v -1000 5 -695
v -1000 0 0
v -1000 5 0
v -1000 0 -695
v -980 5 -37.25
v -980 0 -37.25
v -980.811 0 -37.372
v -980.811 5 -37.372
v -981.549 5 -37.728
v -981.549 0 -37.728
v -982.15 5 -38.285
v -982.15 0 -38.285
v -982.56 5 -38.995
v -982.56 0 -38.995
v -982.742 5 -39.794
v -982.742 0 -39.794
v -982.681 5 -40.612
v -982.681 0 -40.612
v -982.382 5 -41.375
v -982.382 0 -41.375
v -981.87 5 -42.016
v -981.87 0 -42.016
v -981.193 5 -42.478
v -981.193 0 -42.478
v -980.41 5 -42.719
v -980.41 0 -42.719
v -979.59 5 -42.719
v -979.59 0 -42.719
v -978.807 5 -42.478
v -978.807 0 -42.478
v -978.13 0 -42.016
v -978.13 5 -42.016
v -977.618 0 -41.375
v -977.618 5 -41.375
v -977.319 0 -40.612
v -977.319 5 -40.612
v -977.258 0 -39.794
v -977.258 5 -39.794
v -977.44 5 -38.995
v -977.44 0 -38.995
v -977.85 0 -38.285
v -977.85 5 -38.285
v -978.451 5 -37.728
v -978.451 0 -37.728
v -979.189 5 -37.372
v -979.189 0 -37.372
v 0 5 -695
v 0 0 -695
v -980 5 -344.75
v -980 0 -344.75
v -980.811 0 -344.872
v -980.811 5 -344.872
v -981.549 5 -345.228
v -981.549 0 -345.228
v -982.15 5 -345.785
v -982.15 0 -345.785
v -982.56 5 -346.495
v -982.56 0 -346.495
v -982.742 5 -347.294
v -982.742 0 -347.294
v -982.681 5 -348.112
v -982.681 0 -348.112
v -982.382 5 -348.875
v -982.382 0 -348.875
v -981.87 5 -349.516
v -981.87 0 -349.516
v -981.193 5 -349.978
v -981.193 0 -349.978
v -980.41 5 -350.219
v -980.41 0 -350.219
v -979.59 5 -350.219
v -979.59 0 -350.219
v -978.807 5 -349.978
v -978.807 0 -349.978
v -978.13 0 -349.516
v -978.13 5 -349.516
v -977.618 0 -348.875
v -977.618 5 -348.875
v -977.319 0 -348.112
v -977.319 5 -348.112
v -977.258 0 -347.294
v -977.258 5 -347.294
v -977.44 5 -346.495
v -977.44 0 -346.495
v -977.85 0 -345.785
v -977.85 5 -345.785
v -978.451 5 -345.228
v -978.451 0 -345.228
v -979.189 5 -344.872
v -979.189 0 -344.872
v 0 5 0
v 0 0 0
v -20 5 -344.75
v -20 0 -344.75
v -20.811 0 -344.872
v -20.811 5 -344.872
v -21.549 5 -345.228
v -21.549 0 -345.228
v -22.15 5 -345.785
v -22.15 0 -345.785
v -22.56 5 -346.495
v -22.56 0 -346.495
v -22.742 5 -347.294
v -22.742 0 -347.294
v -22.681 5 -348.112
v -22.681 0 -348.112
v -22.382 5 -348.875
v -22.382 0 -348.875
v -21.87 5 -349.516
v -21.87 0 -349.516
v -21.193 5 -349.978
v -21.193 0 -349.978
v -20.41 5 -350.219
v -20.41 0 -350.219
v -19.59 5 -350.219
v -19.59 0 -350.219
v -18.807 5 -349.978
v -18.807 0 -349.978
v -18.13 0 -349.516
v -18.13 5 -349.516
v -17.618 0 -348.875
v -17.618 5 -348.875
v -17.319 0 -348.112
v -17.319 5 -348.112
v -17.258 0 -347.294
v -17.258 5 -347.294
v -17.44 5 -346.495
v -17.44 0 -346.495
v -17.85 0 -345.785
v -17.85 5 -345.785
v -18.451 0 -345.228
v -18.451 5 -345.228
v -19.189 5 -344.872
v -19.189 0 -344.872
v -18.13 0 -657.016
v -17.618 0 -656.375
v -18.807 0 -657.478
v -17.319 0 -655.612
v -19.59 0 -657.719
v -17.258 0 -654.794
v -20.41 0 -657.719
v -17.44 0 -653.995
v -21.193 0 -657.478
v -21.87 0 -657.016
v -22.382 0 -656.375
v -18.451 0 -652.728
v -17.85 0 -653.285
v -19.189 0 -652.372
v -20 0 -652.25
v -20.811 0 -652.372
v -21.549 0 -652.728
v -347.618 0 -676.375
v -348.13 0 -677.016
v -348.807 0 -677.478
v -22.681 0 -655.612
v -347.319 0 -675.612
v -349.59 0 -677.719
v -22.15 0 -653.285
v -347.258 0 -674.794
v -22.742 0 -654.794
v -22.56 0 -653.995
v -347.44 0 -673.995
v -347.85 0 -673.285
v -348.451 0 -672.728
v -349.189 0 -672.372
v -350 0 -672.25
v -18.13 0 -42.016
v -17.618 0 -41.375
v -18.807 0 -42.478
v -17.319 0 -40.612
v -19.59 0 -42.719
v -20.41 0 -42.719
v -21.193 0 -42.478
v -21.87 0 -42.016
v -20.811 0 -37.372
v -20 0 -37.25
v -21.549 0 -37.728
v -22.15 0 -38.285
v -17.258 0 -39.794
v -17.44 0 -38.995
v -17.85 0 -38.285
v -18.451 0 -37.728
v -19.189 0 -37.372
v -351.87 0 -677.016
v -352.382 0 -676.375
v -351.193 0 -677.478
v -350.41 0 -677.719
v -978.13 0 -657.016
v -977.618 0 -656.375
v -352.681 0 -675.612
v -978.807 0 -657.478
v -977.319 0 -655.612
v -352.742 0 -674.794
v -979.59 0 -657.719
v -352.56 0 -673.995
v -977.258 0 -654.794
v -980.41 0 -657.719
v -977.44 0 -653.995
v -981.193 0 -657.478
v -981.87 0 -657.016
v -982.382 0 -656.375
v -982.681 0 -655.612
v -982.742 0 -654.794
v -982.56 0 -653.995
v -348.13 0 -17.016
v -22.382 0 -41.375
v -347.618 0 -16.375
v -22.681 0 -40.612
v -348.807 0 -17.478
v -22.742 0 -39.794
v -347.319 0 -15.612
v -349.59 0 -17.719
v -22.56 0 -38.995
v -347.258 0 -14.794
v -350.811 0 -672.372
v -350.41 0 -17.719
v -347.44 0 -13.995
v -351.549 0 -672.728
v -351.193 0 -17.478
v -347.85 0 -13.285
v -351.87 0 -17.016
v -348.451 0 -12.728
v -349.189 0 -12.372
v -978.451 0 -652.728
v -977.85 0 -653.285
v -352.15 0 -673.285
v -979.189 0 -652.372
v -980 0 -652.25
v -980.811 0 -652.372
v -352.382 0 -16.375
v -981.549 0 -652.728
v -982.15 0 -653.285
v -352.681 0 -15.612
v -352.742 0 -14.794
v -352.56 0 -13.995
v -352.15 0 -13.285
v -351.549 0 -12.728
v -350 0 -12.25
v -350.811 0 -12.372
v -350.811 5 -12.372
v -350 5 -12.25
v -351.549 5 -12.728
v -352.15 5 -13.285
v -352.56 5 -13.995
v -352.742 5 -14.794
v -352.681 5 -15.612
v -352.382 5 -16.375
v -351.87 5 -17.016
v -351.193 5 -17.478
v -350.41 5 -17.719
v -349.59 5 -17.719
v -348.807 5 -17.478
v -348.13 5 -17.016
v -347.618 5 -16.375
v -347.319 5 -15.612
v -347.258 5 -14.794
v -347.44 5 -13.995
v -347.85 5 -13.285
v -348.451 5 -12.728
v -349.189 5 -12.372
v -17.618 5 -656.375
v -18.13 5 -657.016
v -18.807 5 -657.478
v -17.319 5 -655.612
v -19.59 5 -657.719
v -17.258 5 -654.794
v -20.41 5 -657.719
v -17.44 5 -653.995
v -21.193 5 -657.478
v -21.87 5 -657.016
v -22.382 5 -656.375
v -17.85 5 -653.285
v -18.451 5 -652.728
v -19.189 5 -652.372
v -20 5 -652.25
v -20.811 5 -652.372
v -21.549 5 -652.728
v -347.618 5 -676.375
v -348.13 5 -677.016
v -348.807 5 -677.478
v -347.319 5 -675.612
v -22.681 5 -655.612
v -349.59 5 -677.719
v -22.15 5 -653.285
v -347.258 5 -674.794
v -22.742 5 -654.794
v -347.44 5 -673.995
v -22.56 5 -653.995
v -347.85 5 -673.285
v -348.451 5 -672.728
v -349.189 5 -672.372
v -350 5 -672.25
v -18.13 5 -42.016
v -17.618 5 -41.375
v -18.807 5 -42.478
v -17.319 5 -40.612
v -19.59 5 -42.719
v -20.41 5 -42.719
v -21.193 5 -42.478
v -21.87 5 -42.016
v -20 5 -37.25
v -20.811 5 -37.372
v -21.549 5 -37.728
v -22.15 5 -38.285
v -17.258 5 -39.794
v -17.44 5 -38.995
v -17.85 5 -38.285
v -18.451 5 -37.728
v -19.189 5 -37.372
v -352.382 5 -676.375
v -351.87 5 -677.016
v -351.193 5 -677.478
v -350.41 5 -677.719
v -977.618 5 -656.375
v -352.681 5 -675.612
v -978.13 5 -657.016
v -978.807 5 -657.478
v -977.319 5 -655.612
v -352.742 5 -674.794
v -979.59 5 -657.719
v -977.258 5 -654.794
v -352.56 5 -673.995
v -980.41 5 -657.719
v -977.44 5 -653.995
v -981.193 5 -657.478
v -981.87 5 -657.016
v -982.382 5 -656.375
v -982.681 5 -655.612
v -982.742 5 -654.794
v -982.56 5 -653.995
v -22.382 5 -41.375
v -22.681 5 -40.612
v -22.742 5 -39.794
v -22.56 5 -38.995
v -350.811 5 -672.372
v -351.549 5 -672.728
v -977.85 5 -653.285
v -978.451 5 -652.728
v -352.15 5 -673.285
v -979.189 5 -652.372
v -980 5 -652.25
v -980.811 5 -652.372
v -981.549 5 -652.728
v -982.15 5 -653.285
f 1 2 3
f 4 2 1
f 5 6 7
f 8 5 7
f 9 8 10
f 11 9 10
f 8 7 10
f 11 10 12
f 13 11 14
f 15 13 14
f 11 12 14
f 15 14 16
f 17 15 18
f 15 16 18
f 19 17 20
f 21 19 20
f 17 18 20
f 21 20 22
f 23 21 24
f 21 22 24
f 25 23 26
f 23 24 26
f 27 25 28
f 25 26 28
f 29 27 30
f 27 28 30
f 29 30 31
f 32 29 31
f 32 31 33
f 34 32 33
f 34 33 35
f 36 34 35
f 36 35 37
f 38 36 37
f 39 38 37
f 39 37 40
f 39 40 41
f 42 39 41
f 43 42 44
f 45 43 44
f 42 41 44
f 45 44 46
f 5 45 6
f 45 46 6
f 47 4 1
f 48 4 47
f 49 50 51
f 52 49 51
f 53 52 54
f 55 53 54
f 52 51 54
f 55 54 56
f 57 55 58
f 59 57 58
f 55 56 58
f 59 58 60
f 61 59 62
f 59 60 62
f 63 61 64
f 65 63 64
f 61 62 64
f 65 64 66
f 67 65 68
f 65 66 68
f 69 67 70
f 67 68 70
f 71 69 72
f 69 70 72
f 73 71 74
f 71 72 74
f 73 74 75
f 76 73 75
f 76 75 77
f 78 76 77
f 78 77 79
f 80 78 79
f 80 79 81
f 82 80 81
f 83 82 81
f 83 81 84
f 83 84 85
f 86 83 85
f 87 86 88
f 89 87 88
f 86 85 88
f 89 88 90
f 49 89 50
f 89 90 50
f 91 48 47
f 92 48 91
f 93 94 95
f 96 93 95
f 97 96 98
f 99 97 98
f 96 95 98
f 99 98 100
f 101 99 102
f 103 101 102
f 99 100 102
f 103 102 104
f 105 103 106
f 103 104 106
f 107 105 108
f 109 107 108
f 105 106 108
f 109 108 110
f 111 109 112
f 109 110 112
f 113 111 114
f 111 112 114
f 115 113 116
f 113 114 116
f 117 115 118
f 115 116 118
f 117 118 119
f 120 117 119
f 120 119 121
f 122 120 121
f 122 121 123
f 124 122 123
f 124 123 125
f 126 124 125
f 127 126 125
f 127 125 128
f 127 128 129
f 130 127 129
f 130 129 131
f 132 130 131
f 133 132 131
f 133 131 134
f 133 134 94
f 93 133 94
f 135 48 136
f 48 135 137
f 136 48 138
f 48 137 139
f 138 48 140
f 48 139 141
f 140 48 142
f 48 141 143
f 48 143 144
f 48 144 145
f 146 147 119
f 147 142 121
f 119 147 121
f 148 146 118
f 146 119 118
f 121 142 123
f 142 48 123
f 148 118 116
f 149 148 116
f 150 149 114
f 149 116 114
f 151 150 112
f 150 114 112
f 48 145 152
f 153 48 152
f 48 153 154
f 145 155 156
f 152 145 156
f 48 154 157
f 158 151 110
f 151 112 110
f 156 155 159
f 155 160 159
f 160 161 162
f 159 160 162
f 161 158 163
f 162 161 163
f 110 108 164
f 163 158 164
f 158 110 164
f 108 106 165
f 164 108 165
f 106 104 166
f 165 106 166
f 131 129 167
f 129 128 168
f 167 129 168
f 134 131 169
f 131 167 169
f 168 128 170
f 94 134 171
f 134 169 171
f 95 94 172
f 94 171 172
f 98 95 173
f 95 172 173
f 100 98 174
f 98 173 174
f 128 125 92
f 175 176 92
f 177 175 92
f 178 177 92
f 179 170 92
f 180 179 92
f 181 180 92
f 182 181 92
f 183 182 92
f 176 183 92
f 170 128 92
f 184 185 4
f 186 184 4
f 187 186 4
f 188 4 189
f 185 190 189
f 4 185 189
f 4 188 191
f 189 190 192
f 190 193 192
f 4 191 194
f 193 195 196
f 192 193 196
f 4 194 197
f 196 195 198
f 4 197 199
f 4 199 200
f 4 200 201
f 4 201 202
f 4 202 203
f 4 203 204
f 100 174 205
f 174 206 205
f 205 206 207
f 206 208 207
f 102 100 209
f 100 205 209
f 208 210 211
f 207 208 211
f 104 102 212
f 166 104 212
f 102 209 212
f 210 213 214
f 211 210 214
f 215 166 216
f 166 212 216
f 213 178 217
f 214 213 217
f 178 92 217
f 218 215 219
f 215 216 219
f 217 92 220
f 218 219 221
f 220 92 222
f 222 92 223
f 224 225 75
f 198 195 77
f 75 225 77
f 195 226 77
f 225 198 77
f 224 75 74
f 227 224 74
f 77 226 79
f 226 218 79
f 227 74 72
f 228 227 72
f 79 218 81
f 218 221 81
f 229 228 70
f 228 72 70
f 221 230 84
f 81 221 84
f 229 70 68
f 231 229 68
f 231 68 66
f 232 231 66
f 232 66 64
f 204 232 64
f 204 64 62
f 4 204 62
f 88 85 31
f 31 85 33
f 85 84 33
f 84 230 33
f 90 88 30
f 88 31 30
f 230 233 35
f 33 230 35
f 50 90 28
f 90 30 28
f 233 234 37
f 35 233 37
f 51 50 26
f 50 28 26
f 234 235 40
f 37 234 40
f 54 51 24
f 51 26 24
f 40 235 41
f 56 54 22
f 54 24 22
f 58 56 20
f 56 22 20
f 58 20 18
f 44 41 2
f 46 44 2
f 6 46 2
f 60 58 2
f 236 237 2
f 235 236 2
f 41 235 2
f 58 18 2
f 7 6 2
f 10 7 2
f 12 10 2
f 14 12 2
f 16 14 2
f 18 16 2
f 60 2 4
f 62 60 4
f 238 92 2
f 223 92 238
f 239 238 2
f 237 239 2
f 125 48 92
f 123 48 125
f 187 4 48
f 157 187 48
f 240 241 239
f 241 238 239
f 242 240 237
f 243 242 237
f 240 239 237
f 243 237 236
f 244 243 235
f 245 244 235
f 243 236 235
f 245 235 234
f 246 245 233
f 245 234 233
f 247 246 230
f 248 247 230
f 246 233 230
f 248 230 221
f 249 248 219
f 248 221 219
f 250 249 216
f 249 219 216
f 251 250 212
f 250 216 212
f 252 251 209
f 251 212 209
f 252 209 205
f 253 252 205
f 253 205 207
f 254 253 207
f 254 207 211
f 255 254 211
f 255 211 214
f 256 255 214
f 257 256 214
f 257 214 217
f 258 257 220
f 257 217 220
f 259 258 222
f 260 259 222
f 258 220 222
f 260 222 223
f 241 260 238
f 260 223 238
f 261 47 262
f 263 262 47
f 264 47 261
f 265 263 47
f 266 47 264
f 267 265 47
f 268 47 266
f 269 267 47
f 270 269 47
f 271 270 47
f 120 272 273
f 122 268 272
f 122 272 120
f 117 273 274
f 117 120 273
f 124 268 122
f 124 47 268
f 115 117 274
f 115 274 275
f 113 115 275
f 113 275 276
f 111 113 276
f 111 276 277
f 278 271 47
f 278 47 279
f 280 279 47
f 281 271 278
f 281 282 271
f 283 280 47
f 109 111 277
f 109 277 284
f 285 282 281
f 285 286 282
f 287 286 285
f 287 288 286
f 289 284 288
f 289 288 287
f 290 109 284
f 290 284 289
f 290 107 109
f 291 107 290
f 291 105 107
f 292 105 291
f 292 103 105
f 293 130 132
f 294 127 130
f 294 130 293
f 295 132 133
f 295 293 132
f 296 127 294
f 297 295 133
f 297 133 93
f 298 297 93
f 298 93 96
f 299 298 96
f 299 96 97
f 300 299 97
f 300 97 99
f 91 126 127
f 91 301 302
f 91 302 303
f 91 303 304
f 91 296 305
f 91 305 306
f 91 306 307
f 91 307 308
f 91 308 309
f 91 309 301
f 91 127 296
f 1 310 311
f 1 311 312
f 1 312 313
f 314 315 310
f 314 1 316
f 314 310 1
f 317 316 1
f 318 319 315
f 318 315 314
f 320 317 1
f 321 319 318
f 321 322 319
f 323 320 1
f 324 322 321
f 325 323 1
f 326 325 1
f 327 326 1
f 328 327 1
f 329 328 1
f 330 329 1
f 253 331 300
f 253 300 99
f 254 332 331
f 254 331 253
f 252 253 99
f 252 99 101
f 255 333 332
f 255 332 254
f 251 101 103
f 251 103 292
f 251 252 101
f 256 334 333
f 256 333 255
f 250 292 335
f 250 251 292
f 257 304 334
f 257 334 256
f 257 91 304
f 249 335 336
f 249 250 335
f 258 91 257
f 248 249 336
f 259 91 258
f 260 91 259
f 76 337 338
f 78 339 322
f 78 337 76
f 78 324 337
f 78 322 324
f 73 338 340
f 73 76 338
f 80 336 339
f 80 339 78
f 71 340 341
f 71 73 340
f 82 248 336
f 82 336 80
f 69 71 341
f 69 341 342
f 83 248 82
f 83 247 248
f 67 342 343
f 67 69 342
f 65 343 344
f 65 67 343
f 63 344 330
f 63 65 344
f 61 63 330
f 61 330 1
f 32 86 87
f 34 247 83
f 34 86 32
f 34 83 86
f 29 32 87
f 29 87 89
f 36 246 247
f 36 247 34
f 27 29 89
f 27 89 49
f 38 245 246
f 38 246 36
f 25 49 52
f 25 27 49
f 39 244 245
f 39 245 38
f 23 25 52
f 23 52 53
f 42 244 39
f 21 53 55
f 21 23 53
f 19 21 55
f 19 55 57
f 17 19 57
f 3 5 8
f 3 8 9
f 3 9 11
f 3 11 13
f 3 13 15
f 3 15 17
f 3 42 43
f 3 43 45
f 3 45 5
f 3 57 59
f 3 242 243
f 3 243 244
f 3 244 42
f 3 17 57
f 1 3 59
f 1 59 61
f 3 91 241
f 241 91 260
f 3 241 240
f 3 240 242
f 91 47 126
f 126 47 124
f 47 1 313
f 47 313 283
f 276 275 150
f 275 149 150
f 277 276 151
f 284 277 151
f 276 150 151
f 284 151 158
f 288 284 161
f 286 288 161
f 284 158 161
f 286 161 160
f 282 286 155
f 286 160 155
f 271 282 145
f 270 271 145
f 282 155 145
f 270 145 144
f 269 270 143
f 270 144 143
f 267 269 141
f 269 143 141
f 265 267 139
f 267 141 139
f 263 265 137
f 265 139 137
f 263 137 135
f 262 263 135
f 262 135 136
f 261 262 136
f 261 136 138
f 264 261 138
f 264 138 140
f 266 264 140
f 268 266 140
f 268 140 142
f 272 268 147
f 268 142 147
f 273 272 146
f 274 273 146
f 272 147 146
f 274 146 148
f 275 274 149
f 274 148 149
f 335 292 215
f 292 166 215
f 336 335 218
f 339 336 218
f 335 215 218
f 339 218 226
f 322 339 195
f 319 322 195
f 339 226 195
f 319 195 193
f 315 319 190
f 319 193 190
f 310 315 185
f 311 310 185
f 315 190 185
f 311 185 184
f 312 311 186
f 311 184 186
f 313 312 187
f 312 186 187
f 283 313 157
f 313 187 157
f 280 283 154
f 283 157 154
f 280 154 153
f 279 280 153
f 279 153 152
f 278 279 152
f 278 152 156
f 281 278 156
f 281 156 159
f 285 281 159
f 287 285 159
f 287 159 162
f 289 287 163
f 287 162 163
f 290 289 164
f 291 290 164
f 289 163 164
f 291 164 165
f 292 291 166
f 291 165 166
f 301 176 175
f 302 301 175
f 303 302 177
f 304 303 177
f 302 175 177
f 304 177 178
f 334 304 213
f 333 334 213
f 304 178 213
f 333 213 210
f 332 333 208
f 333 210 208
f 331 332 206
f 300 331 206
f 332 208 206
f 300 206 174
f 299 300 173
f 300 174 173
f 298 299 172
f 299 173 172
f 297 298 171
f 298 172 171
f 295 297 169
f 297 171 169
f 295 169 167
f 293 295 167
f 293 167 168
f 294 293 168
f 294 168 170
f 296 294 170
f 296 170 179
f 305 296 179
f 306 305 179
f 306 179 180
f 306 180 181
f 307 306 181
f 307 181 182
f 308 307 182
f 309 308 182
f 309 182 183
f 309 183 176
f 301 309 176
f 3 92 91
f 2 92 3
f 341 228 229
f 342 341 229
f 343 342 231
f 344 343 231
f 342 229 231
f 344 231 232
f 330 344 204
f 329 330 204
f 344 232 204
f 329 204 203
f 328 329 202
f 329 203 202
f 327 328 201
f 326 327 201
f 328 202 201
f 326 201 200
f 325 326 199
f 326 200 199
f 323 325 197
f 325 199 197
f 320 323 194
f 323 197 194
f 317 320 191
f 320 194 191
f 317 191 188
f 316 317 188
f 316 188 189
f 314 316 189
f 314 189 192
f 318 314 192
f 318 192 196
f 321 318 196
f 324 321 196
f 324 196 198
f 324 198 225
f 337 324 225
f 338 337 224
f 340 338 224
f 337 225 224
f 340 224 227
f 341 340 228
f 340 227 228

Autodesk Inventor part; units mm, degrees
ref_plane "YZ Plane" through (0, 0, 0) normal (1, 0, 0) x (0, 1, 0)
ref_plane "XZ Plane" through (0, 0, 0) normal (0, 1, 0) x (-1, 0, 0)
ref_plane "XY Plane" through (0, 0, 0) normal (0, 0, 1) x (1, 0, 0)
sketch "Sketch1" plane through (0, 0, 0) normal (0, 1, 0) x (-1, 0, 0)
  line L0 (0, 0) -> (1000, 0)
  line L1 (1000, 0) -> (1000, -695)
  line L2 (1000, -695) -> (0, -695)
  line L3 (0, -695) -> (0, 0)
  dimension "d0" = 695
  dimension "d1" = 1000
extrude "Extrusion1" add sketch "Sketch1" along normal blind 5
sketch "Sketch2" plane through (0, 5, 0) normal (0, 1, 0) x (1, 0, 0)
  line L0 (-1000, 0) -> (0, 0) projected
  line L1 (0, 0) -> (0, 695) projected
  line L2 (0, 695) -> (-1000, 695) projected
  line L3 (-1000, 695) -> (-1000, 0) projected
  point P0 (-20, 40)
  point P1 (-20, 347.5)
  point P2 (-20, 655)
  point P3 (-980, 40)
  point P4 (-980, 347.5)
  point P5 (-980, 655)
  dimension "d4" = 40
  dimension "d5" = 20
  dimension "d6" = 20
  dimension "d7" = 20
  dimension "d8" = 347.5
  dimension "d9" = 40
  dimension "d14" = 40
  dimension "d15" = 40
  dimension "d16" = 347.5
  dimension "d17" = 20
  dimension "d18" = 20
  dimension "d19" = 20
hole "Hole1" at (-20, 5, -40) at (-20, 5, -347.5) at (-20, 5, -655) at (-980, 5, -40) at (-980, 5, -347.5) at (-980, 5, -655) direction (0, -1, 0) diameter 5.5 end through all
sketch "Sketch3" plane through (0, 5, 0) normal (0, 1, 0) x (1, 0, 0)
  line L0 (0, 0) -> (0, 695) projected
  line L1 (-1000, 0) -> (0, 0) projected
  line L2 (0, 695) -> (-1000, 695) projected
  point P0 (-350, 15)
  point P1 (-350, 675)
  dimension "d27" = 350
  dimension "d28" = 15
  dimension "d29" = 20
  dimension "d30" = 350
hole "Hole2" at (-350, 5, -15) at (-350, 5, -675) direction (0, -1, 0) diameter 5.5 end through all
equation "\"d6\" = d5"
equation "\"d7\" = d5"
equation "\"d9\" = d4"
equation "\"d14\" = d4"
equation "\"d15\" = d4"
equation "\"d16\" = d8"
equation "\"d17\" = d5"
equation "\"d18\" = d5"
equation "\"d19\" = d5"
equation "\"d30\" = d27"
properties part number "SidePanel"
